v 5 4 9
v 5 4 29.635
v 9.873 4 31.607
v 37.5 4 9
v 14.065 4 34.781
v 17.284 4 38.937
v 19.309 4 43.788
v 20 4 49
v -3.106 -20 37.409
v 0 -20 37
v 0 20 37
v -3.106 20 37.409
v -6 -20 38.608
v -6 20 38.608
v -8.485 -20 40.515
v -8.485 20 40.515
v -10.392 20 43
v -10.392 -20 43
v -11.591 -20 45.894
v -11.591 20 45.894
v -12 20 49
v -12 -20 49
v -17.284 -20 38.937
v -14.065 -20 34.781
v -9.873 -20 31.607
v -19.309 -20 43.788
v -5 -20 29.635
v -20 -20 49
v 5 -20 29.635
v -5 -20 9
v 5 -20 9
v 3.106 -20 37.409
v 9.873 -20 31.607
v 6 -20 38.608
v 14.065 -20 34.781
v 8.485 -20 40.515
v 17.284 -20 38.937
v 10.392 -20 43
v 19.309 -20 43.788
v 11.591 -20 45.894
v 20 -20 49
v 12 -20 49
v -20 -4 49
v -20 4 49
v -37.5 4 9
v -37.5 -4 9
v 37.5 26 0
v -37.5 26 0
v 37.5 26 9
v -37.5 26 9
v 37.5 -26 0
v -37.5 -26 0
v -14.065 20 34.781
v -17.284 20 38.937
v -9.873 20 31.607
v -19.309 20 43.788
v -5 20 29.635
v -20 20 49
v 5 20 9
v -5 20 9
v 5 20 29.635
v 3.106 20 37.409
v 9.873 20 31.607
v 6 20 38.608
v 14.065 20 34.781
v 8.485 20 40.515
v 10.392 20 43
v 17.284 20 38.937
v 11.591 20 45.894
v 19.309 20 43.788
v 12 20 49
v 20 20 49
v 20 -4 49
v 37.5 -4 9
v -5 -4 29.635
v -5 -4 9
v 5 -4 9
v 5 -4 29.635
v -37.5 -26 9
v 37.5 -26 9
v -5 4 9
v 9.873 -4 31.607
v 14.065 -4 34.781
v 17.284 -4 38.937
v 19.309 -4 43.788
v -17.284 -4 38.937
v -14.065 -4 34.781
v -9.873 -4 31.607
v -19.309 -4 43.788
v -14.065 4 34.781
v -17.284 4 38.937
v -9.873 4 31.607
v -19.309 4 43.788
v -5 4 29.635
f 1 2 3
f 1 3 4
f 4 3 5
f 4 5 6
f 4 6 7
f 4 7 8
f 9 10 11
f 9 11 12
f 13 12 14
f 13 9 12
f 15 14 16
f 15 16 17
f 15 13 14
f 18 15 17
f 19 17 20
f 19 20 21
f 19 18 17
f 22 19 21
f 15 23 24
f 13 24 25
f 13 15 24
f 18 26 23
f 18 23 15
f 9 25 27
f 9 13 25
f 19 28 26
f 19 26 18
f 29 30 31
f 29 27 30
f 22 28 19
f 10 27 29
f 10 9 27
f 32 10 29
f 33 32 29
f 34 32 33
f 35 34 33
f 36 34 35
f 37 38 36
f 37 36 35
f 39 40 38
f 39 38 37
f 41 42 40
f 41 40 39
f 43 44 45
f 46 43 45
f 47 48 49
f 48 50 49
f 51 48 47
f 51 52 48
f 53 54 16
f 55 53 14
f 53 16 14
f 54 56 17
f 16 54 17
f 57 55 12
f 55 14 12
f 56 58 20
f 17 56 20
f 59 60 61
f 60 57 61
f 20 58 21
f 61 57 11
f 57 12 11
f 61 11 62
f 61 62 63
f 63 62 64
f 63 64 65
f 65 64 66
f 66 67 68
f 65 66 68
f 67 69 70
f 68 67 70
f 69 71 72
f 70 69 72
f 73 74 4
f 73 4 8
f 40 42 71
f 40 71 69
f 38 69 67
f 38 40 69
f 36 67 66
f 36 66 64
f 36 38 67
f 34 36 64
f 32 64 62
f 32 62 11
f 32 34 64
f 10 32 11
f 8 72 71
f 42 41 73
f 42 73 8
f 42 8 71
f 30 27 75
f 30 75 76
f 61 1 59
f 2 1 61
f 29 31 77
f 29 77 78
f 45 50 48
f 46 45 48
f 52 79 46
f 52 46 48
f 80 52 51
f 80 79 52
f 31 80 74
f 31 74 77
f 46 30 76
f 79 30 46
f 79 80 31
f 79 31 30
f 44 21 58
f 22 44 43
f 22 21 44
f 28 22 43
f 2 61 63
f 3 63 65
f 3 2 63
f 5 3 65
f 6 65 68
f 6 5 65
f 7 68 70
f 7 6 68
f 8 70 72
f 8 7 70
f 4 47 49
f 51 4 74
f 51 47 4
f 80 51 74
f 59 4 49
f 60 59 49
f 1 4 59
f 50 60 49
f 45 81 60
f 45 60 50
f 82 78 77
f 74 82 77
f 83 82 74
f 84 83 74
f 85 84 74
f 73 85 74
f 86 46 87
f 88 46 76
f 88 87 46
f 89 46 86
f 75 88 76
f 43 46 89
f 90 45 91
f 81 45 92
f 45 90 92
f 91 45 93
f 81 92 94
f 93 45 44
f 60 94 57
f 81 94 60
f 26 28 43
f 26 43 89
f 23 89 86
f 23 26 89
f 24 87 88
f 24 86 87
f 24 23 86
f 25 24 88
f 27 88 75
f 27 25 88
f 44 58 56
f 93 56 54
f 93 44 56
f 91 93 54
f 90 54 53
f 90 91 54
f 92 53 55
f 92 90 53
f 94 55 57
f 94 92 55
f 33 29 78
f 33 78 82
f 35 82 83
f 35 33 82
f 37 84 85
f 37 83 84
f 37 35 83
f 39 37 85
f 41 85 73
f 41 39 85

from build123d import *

# Parameters (mm, degrees)
F1_DEPTH = 26
F2_DEPTH = 20
F3_DEPTH = 4


with BuildPart() as f1:
    # F0 (on Front) → F1 (new body, symmetric)
    with BuildSketch(Plane.XZ):
        Polygon((-37.5, 0), (0, 0), (0, 9), (-5, 9), (-37.5, 9), align=None)
        Polygon((0, 9), (0, 0), (37.5, 0), (37.5, 9), (5, 9), align=None)
    extrude(amount=F1_DEPTH, both=True)

    # F0 (on Front) → F2 (join, symmetric)
    with BuildSketch(Plane.XZ):
        with BuildLine():
            Line((-5, 9), (0, 9))
            Line((0, 9), (0, 33.611993))
            Line((0, 33.611993), (0, 37))
            ThreePointArc((0, 37), (-8.485281, 40.514719), (-12, 49))
            Line((-12, 49), (-20, 49))
            ThreePointArc((-20, 49), (-15.811388, 36.752551), (-5, 29.635083))
            Line((-5, 29.635083), (-5, 9))
        make_face()
        with BuildLine():
            Line((0, 33.611993), (0, 9))
            Line((0, 9), (5, 9))
            Line((5, 9), (5, 29.635083))
            ThreePointArc((5, 29.635083), (15.811388, 36.752551), (20, 49))
            Line((20, 49), (12, 49))
            ThreePointArc((12, 49), (8.485281, 40.514719), (0, 37))
            Line((0, 37), (0, 33.611993))
        make_face()
    extrude(amount=F2_DEPTH, both=True)

    # F0 (on Front) → F3 (join, symmetric)
    with BuildSketch(Plane.XZ):
        with BuildLine():
            Line((-37.5, 9), (-5, 9))
            Line((-5, 9), (-5, 29.635083))
            ThreePointArc((-5, 29.635083), (-15.811388, 36.752551), (-20, 49))
            Line((-20, 49), (-37.5, 9))
        make_face()
        with BuildLine():
            Line((5, 9), (37.5, 9))
            Line((37.5, 9), (20, 49))
            ThreePointArc((20, 49), (15.811388, 36.752551), (5, 29.635083))
            Line((5, 29.635083), (5, 9))
        make_face()
    extrude(amount=F3_DEPTH, both=True)


solid = f1.part
